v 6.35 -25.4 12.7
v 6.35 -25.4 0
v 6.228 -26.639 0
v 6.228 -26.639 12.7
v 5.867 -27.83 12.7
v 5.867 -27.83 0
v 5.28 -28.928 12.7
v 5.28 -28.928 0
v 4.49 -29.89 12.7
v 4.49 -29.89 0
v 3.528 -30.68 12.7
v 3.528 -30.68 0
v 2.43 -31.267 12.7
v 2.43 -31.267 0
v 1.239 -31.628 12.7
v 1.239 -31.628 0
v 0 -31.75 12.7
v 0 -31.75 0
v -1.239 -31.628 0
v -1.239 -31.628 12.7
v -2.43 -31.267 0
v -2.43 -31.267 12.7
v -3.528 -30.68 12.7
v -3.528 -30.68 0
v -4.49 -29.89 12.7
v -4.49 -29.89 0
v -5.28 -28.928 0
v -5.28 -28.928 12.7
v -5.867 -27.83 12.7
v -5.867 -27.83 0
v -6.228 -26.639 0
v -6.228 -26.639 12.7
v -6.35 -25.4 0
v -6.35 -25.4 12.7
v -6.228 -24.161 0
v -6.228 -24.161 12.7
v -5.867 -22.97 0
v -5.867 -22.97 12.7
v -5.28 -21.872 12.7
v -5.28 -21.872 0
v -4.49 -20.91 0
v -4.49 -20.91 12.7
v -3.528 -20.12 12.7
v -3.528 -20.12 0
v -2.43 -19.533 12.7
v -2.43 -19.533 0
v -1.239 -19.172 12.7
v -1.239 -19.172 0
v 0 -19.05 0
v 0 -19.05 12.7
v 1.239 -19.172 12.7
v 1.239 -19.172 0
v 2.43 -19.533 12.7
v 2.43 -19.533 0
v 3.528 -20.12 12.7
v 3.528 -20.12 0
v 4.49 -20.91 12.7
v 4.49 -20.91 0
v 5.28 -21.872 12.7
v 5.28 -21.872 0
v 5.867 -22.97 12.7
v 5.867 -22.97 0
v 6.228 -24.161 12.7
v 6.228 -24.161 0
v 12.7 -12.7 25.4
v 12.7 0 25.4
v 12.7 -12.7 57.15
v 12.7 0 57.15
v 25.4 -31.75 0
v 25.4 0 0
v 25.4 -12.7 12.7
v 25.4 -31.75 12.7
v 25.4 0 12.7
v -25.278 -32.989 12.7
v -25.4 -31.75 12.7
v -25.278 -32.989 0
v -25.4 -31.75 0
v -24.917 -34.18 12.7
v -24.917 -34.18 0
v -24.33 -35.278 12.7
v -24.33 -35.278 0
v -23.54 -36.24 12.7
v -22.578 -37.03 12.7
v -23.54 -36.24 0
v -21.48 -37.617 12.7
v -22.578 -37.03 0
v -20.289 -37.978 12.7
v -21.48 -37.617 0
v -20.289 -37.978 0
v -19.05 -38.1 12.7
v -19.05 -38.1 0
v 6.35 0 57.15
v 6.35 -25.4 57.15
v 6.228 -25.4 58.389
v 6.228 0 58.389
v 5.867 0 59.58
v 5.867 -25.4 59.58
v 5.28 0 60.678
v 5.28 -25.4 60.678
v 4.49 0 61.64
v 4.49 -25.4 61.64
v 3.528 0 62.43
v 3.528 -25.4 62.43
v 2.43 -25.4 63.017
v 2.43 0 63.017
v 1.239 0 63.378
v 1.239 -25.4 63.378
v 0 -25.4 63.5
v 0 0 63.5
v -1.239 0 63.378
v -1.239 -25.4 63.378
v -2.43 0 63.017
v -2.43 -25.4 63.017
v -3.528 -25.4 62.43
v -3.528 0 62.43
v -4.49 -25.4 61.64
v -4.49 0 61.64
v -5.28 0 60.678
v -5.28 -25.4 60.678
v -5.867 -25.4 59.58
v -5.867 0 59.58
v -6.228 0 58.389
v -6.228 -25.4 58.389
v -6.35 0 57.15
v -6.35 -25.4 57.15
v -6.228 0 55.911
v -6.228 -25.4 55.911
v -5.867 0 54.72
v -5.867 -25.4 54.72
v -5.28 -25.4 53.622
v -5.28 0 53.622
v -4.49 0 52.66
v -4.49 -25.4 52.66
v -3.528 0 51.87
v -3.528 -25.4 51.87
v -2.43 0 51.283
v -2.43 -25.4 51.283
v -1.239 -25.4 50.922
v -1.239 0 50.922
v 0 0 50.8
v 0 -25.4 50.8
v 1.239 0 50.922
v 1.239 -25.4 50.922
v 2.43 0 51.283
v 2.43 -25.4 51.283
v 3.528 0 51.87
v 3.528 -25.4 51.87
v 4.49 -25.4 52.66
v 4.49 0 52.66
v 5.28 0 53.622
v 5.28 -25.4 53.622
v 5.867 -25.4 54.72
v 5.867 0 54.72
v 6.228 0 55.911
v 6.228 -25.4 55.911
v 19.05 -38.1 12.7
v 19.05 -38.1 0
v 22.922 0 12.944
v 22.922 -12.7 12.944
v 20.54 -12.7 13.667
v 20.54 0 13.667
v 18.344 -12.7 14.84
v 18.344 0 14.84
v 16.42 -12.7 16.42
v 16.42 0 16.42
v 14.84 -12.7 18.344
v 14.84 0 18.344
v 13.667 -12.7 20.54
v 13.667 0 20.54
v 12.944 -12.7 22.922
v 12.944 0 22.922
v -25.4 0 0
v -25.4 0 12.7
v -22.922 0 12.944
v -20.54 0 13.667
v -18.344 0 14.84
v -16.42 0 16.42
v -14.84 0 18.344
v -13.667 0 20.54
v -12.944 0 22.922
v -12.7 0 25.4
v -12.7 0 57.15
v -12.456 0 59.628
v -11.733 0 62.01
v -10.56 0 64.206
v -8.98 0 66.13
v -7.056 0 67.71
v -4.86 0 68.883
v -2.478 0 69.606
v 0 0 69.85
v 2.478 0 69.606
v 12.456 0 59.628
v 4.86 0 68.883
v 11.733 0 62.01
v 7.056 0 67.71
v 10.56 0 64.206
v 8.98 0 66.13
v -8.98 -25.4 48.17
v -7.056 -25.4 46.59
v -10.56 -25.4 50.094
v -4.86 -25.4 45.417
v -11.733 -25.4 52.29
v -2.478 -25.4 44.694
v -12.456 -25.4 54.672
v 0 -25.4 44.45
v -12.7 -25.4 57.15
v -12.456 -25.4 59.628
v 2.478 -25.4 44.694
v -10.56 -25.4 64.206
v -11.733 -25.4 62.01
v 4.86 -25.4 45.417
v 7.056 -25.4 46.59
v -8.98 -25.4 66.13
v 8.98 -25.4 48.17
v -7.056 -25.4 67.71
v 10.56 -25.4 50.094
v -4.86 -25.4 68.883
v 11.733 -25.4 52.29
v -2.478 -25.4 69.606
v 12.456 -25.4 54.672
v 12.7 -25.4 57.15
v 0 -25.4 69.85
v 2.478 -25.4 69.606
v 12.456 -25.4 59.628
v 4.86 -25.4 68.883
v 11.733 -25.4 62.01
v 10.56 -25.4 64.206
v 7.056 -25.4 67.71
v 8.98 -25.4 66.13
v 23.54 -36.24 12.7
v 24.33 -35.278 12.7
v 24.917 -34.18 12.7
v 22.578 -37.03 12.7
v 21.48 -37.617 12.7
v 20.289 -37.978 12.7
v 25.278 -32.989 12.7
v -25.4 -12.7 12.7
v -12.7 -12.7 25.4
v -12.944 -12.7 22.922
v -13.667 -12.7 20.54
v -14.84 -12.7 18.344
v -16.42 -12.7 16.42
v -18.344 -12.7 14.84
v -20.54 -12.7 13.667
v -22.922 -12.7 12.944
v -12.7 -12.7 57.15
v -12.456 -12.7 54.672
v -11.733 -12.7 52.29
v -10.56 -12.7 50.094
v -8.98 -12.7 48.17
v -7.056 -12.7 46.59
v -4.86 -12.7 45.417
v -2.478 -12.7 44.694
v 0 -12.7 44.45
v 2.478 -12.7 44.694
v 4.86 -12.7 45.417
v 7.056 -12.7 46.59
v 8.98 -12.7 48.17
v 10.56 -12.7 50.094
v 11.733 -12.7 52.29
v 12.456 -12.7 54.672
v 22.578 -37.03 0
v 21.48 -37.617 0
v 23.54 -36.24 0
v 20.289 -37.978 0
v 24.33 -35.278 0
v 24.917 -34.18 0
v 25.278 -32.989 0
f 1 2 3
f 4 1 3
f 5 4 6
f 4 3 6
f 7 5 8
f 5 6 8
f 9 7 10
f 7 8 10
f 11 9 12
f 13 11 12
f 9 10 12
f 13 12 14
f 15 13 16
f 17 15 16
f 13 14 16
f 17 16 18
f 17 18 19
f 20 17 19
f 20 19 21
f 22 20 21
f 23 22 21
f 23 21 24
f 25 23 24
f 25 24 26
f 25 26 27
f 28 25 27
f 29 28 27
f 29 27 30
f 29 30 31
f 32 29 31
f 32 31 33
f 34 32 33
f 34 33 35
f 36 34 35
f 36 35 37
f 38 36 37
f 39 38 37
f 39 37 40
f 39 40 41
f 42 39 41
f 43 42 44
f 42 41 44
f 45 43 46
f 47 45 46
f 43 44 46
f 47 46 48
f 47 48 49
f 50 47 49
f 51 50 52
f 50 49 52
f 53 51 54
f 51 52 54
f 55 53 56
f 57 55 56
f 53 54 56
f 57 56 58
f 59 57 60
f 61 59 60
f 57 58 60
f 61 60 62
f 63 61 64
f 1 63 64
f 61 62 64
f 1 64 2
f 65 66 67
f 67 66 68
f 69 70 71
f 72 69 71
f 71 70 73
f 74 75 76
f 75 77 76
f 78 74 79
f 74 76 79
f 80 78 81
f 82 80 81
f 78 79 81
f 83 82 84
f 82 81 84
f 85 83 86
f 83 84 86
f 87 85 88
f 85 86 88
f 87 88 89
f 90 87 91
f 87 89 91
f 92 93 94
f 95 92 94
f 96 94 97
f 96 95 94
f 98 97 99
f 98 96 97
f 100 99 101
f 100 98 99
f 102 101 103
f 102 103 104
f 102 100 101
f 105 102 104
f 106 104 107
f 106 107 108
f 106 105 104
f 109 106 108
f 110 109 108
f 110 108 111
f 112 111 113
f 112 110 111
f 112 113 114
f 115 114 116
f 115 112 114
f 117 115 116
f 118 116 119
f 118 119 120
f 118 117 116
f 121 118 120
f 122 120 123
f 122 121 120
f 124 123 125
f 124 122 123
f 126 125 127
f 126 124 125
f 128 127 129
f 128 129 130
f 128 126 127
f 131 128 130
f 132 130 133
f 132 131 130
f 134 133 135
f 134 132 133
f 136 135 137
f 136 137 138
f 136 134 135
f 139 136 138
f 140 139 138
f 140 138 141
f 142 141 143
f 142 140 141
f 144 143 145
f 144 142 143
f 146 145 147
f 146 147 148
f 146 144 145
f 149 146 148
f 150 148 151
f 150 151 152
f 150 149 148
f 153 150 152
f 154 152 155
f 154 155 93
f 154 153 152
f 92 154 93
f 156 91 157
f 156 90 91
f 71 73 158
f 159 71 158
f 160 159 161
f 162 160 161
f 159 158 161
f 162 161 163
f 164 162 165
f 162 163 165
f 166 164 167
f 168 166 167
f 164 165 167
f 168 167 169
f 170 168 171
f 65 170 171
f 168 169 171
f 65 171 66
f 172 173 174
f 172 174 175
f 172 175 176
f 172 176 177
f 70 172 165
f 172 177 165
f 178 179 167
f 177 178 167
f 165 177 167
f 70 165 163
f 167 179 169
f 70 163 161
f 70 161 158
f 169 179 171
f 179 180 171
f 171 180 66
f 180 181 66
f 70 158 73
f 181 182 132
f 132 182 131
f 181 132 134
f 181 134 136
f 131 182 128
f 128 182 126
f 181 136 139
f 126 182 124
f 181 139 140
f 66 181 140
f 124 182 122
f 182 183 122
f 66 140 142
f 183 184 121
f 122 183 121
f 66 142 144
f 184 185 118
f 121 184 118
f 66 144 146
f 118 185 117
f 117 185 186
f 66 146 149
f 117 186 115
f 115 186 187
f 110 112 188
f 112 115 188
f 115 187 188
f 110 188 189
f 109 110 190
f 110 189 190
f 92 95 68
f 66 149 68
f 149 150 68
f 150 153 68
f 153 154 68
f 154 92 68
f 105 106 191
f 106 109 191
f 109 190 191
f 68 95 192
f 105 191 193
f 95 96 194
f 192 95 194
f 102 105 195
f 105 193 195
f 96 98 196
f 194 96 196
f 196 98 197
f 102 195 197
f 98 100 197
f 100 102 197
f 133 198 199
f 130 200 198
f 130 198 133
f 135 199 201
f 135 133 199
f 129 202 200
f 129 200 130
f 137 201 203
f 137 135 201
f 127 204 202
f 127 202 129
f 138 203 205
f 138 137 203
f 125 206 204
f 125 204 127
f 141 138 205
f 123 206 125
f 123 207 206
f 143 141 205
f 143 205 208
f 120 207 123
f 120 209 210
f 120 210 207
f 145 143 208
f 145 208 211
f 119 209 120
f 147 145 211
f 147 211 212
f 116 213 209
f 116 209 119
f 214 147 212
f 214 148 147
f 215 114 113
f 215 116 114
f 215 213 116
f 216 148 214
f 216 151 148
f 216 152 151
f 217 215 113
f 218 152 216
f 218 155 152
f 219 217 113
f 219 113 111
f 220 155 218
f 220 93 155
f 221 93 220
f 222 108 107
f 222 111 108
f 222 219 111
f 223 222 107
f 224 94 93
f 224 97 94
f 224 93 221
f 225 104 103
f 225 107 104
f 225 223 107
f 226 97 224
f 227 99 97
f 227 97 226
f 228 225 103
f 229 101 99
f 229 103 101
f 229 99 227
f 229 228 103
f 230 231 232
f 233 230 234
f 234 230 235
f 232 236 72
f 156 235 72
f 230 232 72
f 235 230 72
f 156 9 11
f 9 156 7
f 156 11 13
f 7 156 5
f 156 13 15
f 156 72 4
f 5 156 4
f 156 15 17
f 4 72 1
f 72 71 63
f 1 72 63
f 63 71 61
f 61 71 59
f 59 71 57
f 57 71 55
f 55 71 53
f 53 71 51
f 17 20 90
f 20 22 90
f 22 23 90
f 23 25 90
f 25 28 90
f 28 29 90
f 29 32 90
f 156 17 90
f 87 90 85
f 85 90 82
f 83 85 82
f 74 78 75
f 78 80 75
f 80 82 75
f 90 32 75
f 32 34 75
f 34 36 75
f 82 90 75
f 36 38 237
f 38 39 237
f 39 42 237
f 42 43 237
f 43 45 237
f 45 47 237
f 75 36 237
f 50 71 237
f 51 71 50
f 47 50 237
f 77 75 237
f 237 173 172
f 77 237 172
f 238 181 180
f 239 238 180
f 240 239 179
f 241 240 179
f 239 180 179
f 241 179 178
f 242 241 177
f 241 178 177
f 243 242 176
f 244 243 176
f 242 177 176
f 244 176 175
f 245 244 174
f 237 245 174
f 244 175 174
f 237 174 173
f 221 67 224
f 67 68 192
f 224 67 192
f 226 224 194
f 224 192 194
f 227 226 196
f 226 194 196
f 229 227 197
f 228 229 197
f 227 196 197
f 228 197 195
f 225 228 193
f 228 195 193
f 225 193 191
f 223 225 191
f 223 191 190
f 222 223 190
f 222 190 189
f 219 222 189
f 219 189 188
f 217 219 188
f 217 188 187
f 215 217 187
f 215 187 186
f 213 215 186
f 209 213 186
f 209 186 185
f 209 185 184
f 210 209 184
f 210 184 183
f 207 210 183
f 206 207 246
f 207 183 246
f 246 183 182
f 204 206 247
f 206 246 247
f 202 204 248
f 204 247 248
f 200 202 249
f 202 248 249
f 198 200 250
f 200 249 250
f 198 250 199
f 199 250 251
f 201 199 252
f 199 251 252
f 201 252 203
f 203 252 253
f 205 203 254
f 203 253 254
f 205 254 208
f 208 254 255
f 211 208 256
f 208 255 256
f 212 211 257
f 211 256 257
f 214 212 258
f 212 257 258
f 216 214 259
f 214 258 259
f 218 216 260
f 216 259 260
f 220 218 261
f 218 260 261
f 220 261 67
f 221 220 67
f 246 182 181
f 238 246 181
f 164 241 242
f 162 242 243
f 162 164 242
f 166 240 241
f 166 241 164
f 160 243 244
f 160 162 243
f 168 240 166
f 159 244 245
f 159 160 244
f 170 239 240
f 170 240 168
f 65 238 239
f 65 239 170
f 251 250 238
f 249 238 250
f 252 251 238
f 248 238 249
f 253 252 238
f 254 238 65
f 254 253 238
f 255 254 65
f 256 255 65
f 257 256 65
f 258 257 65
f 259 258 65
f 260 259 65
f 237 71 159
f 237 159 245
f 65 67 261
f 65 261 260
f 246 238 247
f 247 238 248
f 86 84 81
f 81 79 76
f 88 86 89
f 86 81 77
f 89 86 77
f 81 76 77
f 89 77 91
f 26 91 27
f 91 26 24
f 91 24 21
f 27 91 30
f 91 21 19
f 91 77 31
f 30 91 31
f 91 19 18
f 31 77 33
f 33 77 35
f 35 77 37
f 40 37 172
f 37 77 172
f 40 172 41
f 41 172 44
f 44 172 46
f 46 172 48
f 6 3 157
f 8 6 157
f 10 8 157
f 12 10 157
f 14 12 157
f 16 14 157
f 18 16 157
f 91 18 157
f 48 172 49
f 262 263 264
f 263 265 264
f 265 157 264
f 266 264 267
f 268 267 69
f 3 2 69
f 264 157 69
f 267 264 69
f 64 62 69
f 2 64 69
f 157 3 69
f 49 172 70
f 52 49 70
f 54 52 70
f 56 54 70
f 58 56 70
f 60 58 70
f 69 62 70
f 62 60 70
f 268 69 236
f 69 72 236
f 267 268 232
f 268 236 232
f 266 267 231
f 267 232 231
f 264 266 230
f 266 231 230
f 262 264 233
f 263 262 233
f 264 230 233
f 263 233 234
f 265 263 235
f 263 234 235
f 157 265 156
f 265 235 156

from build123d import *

# Parameters (mm, degrees)
F1_DEPTH = 12.7
F0_R     = 6.35
F2_DEPTH = 25.4
F3_DEPTH = 38.1
F4_R     = 6.35
F5_R     = 6.35
F6_DEPTH = 25.4


with BuildPart() as f1:
    # F0 (on Front) → F1 (new body)
    with BuildSketch(Plane.XZ):
        with BuildLine():
            Line((-25.4, 12.7), (25.4, 12.7))
            ThreePointArc((25.4, 12.7), (16.419744, 16.419744), (12.7, 25.4))
            Line((12.7, 25.4), (12.7, 57.15))
            ThreePointArc((12.7, 57.15), (0, 44.45), (-12.7, 57.15))
            Line((-12.7, 57.15), (-12.7, 25.4))
            ThreePointArc((-12.7, 25.4), (-16.419744, 16.419744), (-25.4, 12.7))
        make_face()
    extrude(amount=F1_DEPTH)

    # F0 (on Front) → F2 (join)
    with BuildSketch(Plane.XZ):
        with BuildLine():
            ThreePointArc((-12.7, 57.15), (0, 44.45), (12.7, 57.15))
            ThreePointArc((12.7, 57.15), (0, 69.85), (-12.7, 57.15))
        make_face()
        with Locations((0, 57.15)):
            Circle(F0_R, mode=Mode.SUBTRACT)
    extrude(amount=F2_DEPTH)

    # F0 (on Front) → F3 (join)
    with BuildSketch(Plane.XZ):
        Polygon((-25.4, 0), (0, 0), (25.4, 0), (25.4, 12.7), (-25.4, 12.7), align=None)
    extrude(amount=F3_DEPTH)

    # F4
    f4_edges = [f1.edges().sort_by_distance(p)[0] for p in [
        (-25.4, -38.1, 6.35),
        (25.4, -38.1, 6.35),
    ]]
    fillet(f4_edges, radius=F4_R)

    # F5 (on face) → F6 (cut)
    with BuildSketch(Plane(origin=(0, 0, 0), x_dir=(1, 0, 0), z_dir=(0, 0, -1))):
        with Locations((0, 25.4)):
            Circle(F5_R)
    extrude(amount=-F6_DEPTH, mode=Mode.SUBTRACT)


solid = f1.part
